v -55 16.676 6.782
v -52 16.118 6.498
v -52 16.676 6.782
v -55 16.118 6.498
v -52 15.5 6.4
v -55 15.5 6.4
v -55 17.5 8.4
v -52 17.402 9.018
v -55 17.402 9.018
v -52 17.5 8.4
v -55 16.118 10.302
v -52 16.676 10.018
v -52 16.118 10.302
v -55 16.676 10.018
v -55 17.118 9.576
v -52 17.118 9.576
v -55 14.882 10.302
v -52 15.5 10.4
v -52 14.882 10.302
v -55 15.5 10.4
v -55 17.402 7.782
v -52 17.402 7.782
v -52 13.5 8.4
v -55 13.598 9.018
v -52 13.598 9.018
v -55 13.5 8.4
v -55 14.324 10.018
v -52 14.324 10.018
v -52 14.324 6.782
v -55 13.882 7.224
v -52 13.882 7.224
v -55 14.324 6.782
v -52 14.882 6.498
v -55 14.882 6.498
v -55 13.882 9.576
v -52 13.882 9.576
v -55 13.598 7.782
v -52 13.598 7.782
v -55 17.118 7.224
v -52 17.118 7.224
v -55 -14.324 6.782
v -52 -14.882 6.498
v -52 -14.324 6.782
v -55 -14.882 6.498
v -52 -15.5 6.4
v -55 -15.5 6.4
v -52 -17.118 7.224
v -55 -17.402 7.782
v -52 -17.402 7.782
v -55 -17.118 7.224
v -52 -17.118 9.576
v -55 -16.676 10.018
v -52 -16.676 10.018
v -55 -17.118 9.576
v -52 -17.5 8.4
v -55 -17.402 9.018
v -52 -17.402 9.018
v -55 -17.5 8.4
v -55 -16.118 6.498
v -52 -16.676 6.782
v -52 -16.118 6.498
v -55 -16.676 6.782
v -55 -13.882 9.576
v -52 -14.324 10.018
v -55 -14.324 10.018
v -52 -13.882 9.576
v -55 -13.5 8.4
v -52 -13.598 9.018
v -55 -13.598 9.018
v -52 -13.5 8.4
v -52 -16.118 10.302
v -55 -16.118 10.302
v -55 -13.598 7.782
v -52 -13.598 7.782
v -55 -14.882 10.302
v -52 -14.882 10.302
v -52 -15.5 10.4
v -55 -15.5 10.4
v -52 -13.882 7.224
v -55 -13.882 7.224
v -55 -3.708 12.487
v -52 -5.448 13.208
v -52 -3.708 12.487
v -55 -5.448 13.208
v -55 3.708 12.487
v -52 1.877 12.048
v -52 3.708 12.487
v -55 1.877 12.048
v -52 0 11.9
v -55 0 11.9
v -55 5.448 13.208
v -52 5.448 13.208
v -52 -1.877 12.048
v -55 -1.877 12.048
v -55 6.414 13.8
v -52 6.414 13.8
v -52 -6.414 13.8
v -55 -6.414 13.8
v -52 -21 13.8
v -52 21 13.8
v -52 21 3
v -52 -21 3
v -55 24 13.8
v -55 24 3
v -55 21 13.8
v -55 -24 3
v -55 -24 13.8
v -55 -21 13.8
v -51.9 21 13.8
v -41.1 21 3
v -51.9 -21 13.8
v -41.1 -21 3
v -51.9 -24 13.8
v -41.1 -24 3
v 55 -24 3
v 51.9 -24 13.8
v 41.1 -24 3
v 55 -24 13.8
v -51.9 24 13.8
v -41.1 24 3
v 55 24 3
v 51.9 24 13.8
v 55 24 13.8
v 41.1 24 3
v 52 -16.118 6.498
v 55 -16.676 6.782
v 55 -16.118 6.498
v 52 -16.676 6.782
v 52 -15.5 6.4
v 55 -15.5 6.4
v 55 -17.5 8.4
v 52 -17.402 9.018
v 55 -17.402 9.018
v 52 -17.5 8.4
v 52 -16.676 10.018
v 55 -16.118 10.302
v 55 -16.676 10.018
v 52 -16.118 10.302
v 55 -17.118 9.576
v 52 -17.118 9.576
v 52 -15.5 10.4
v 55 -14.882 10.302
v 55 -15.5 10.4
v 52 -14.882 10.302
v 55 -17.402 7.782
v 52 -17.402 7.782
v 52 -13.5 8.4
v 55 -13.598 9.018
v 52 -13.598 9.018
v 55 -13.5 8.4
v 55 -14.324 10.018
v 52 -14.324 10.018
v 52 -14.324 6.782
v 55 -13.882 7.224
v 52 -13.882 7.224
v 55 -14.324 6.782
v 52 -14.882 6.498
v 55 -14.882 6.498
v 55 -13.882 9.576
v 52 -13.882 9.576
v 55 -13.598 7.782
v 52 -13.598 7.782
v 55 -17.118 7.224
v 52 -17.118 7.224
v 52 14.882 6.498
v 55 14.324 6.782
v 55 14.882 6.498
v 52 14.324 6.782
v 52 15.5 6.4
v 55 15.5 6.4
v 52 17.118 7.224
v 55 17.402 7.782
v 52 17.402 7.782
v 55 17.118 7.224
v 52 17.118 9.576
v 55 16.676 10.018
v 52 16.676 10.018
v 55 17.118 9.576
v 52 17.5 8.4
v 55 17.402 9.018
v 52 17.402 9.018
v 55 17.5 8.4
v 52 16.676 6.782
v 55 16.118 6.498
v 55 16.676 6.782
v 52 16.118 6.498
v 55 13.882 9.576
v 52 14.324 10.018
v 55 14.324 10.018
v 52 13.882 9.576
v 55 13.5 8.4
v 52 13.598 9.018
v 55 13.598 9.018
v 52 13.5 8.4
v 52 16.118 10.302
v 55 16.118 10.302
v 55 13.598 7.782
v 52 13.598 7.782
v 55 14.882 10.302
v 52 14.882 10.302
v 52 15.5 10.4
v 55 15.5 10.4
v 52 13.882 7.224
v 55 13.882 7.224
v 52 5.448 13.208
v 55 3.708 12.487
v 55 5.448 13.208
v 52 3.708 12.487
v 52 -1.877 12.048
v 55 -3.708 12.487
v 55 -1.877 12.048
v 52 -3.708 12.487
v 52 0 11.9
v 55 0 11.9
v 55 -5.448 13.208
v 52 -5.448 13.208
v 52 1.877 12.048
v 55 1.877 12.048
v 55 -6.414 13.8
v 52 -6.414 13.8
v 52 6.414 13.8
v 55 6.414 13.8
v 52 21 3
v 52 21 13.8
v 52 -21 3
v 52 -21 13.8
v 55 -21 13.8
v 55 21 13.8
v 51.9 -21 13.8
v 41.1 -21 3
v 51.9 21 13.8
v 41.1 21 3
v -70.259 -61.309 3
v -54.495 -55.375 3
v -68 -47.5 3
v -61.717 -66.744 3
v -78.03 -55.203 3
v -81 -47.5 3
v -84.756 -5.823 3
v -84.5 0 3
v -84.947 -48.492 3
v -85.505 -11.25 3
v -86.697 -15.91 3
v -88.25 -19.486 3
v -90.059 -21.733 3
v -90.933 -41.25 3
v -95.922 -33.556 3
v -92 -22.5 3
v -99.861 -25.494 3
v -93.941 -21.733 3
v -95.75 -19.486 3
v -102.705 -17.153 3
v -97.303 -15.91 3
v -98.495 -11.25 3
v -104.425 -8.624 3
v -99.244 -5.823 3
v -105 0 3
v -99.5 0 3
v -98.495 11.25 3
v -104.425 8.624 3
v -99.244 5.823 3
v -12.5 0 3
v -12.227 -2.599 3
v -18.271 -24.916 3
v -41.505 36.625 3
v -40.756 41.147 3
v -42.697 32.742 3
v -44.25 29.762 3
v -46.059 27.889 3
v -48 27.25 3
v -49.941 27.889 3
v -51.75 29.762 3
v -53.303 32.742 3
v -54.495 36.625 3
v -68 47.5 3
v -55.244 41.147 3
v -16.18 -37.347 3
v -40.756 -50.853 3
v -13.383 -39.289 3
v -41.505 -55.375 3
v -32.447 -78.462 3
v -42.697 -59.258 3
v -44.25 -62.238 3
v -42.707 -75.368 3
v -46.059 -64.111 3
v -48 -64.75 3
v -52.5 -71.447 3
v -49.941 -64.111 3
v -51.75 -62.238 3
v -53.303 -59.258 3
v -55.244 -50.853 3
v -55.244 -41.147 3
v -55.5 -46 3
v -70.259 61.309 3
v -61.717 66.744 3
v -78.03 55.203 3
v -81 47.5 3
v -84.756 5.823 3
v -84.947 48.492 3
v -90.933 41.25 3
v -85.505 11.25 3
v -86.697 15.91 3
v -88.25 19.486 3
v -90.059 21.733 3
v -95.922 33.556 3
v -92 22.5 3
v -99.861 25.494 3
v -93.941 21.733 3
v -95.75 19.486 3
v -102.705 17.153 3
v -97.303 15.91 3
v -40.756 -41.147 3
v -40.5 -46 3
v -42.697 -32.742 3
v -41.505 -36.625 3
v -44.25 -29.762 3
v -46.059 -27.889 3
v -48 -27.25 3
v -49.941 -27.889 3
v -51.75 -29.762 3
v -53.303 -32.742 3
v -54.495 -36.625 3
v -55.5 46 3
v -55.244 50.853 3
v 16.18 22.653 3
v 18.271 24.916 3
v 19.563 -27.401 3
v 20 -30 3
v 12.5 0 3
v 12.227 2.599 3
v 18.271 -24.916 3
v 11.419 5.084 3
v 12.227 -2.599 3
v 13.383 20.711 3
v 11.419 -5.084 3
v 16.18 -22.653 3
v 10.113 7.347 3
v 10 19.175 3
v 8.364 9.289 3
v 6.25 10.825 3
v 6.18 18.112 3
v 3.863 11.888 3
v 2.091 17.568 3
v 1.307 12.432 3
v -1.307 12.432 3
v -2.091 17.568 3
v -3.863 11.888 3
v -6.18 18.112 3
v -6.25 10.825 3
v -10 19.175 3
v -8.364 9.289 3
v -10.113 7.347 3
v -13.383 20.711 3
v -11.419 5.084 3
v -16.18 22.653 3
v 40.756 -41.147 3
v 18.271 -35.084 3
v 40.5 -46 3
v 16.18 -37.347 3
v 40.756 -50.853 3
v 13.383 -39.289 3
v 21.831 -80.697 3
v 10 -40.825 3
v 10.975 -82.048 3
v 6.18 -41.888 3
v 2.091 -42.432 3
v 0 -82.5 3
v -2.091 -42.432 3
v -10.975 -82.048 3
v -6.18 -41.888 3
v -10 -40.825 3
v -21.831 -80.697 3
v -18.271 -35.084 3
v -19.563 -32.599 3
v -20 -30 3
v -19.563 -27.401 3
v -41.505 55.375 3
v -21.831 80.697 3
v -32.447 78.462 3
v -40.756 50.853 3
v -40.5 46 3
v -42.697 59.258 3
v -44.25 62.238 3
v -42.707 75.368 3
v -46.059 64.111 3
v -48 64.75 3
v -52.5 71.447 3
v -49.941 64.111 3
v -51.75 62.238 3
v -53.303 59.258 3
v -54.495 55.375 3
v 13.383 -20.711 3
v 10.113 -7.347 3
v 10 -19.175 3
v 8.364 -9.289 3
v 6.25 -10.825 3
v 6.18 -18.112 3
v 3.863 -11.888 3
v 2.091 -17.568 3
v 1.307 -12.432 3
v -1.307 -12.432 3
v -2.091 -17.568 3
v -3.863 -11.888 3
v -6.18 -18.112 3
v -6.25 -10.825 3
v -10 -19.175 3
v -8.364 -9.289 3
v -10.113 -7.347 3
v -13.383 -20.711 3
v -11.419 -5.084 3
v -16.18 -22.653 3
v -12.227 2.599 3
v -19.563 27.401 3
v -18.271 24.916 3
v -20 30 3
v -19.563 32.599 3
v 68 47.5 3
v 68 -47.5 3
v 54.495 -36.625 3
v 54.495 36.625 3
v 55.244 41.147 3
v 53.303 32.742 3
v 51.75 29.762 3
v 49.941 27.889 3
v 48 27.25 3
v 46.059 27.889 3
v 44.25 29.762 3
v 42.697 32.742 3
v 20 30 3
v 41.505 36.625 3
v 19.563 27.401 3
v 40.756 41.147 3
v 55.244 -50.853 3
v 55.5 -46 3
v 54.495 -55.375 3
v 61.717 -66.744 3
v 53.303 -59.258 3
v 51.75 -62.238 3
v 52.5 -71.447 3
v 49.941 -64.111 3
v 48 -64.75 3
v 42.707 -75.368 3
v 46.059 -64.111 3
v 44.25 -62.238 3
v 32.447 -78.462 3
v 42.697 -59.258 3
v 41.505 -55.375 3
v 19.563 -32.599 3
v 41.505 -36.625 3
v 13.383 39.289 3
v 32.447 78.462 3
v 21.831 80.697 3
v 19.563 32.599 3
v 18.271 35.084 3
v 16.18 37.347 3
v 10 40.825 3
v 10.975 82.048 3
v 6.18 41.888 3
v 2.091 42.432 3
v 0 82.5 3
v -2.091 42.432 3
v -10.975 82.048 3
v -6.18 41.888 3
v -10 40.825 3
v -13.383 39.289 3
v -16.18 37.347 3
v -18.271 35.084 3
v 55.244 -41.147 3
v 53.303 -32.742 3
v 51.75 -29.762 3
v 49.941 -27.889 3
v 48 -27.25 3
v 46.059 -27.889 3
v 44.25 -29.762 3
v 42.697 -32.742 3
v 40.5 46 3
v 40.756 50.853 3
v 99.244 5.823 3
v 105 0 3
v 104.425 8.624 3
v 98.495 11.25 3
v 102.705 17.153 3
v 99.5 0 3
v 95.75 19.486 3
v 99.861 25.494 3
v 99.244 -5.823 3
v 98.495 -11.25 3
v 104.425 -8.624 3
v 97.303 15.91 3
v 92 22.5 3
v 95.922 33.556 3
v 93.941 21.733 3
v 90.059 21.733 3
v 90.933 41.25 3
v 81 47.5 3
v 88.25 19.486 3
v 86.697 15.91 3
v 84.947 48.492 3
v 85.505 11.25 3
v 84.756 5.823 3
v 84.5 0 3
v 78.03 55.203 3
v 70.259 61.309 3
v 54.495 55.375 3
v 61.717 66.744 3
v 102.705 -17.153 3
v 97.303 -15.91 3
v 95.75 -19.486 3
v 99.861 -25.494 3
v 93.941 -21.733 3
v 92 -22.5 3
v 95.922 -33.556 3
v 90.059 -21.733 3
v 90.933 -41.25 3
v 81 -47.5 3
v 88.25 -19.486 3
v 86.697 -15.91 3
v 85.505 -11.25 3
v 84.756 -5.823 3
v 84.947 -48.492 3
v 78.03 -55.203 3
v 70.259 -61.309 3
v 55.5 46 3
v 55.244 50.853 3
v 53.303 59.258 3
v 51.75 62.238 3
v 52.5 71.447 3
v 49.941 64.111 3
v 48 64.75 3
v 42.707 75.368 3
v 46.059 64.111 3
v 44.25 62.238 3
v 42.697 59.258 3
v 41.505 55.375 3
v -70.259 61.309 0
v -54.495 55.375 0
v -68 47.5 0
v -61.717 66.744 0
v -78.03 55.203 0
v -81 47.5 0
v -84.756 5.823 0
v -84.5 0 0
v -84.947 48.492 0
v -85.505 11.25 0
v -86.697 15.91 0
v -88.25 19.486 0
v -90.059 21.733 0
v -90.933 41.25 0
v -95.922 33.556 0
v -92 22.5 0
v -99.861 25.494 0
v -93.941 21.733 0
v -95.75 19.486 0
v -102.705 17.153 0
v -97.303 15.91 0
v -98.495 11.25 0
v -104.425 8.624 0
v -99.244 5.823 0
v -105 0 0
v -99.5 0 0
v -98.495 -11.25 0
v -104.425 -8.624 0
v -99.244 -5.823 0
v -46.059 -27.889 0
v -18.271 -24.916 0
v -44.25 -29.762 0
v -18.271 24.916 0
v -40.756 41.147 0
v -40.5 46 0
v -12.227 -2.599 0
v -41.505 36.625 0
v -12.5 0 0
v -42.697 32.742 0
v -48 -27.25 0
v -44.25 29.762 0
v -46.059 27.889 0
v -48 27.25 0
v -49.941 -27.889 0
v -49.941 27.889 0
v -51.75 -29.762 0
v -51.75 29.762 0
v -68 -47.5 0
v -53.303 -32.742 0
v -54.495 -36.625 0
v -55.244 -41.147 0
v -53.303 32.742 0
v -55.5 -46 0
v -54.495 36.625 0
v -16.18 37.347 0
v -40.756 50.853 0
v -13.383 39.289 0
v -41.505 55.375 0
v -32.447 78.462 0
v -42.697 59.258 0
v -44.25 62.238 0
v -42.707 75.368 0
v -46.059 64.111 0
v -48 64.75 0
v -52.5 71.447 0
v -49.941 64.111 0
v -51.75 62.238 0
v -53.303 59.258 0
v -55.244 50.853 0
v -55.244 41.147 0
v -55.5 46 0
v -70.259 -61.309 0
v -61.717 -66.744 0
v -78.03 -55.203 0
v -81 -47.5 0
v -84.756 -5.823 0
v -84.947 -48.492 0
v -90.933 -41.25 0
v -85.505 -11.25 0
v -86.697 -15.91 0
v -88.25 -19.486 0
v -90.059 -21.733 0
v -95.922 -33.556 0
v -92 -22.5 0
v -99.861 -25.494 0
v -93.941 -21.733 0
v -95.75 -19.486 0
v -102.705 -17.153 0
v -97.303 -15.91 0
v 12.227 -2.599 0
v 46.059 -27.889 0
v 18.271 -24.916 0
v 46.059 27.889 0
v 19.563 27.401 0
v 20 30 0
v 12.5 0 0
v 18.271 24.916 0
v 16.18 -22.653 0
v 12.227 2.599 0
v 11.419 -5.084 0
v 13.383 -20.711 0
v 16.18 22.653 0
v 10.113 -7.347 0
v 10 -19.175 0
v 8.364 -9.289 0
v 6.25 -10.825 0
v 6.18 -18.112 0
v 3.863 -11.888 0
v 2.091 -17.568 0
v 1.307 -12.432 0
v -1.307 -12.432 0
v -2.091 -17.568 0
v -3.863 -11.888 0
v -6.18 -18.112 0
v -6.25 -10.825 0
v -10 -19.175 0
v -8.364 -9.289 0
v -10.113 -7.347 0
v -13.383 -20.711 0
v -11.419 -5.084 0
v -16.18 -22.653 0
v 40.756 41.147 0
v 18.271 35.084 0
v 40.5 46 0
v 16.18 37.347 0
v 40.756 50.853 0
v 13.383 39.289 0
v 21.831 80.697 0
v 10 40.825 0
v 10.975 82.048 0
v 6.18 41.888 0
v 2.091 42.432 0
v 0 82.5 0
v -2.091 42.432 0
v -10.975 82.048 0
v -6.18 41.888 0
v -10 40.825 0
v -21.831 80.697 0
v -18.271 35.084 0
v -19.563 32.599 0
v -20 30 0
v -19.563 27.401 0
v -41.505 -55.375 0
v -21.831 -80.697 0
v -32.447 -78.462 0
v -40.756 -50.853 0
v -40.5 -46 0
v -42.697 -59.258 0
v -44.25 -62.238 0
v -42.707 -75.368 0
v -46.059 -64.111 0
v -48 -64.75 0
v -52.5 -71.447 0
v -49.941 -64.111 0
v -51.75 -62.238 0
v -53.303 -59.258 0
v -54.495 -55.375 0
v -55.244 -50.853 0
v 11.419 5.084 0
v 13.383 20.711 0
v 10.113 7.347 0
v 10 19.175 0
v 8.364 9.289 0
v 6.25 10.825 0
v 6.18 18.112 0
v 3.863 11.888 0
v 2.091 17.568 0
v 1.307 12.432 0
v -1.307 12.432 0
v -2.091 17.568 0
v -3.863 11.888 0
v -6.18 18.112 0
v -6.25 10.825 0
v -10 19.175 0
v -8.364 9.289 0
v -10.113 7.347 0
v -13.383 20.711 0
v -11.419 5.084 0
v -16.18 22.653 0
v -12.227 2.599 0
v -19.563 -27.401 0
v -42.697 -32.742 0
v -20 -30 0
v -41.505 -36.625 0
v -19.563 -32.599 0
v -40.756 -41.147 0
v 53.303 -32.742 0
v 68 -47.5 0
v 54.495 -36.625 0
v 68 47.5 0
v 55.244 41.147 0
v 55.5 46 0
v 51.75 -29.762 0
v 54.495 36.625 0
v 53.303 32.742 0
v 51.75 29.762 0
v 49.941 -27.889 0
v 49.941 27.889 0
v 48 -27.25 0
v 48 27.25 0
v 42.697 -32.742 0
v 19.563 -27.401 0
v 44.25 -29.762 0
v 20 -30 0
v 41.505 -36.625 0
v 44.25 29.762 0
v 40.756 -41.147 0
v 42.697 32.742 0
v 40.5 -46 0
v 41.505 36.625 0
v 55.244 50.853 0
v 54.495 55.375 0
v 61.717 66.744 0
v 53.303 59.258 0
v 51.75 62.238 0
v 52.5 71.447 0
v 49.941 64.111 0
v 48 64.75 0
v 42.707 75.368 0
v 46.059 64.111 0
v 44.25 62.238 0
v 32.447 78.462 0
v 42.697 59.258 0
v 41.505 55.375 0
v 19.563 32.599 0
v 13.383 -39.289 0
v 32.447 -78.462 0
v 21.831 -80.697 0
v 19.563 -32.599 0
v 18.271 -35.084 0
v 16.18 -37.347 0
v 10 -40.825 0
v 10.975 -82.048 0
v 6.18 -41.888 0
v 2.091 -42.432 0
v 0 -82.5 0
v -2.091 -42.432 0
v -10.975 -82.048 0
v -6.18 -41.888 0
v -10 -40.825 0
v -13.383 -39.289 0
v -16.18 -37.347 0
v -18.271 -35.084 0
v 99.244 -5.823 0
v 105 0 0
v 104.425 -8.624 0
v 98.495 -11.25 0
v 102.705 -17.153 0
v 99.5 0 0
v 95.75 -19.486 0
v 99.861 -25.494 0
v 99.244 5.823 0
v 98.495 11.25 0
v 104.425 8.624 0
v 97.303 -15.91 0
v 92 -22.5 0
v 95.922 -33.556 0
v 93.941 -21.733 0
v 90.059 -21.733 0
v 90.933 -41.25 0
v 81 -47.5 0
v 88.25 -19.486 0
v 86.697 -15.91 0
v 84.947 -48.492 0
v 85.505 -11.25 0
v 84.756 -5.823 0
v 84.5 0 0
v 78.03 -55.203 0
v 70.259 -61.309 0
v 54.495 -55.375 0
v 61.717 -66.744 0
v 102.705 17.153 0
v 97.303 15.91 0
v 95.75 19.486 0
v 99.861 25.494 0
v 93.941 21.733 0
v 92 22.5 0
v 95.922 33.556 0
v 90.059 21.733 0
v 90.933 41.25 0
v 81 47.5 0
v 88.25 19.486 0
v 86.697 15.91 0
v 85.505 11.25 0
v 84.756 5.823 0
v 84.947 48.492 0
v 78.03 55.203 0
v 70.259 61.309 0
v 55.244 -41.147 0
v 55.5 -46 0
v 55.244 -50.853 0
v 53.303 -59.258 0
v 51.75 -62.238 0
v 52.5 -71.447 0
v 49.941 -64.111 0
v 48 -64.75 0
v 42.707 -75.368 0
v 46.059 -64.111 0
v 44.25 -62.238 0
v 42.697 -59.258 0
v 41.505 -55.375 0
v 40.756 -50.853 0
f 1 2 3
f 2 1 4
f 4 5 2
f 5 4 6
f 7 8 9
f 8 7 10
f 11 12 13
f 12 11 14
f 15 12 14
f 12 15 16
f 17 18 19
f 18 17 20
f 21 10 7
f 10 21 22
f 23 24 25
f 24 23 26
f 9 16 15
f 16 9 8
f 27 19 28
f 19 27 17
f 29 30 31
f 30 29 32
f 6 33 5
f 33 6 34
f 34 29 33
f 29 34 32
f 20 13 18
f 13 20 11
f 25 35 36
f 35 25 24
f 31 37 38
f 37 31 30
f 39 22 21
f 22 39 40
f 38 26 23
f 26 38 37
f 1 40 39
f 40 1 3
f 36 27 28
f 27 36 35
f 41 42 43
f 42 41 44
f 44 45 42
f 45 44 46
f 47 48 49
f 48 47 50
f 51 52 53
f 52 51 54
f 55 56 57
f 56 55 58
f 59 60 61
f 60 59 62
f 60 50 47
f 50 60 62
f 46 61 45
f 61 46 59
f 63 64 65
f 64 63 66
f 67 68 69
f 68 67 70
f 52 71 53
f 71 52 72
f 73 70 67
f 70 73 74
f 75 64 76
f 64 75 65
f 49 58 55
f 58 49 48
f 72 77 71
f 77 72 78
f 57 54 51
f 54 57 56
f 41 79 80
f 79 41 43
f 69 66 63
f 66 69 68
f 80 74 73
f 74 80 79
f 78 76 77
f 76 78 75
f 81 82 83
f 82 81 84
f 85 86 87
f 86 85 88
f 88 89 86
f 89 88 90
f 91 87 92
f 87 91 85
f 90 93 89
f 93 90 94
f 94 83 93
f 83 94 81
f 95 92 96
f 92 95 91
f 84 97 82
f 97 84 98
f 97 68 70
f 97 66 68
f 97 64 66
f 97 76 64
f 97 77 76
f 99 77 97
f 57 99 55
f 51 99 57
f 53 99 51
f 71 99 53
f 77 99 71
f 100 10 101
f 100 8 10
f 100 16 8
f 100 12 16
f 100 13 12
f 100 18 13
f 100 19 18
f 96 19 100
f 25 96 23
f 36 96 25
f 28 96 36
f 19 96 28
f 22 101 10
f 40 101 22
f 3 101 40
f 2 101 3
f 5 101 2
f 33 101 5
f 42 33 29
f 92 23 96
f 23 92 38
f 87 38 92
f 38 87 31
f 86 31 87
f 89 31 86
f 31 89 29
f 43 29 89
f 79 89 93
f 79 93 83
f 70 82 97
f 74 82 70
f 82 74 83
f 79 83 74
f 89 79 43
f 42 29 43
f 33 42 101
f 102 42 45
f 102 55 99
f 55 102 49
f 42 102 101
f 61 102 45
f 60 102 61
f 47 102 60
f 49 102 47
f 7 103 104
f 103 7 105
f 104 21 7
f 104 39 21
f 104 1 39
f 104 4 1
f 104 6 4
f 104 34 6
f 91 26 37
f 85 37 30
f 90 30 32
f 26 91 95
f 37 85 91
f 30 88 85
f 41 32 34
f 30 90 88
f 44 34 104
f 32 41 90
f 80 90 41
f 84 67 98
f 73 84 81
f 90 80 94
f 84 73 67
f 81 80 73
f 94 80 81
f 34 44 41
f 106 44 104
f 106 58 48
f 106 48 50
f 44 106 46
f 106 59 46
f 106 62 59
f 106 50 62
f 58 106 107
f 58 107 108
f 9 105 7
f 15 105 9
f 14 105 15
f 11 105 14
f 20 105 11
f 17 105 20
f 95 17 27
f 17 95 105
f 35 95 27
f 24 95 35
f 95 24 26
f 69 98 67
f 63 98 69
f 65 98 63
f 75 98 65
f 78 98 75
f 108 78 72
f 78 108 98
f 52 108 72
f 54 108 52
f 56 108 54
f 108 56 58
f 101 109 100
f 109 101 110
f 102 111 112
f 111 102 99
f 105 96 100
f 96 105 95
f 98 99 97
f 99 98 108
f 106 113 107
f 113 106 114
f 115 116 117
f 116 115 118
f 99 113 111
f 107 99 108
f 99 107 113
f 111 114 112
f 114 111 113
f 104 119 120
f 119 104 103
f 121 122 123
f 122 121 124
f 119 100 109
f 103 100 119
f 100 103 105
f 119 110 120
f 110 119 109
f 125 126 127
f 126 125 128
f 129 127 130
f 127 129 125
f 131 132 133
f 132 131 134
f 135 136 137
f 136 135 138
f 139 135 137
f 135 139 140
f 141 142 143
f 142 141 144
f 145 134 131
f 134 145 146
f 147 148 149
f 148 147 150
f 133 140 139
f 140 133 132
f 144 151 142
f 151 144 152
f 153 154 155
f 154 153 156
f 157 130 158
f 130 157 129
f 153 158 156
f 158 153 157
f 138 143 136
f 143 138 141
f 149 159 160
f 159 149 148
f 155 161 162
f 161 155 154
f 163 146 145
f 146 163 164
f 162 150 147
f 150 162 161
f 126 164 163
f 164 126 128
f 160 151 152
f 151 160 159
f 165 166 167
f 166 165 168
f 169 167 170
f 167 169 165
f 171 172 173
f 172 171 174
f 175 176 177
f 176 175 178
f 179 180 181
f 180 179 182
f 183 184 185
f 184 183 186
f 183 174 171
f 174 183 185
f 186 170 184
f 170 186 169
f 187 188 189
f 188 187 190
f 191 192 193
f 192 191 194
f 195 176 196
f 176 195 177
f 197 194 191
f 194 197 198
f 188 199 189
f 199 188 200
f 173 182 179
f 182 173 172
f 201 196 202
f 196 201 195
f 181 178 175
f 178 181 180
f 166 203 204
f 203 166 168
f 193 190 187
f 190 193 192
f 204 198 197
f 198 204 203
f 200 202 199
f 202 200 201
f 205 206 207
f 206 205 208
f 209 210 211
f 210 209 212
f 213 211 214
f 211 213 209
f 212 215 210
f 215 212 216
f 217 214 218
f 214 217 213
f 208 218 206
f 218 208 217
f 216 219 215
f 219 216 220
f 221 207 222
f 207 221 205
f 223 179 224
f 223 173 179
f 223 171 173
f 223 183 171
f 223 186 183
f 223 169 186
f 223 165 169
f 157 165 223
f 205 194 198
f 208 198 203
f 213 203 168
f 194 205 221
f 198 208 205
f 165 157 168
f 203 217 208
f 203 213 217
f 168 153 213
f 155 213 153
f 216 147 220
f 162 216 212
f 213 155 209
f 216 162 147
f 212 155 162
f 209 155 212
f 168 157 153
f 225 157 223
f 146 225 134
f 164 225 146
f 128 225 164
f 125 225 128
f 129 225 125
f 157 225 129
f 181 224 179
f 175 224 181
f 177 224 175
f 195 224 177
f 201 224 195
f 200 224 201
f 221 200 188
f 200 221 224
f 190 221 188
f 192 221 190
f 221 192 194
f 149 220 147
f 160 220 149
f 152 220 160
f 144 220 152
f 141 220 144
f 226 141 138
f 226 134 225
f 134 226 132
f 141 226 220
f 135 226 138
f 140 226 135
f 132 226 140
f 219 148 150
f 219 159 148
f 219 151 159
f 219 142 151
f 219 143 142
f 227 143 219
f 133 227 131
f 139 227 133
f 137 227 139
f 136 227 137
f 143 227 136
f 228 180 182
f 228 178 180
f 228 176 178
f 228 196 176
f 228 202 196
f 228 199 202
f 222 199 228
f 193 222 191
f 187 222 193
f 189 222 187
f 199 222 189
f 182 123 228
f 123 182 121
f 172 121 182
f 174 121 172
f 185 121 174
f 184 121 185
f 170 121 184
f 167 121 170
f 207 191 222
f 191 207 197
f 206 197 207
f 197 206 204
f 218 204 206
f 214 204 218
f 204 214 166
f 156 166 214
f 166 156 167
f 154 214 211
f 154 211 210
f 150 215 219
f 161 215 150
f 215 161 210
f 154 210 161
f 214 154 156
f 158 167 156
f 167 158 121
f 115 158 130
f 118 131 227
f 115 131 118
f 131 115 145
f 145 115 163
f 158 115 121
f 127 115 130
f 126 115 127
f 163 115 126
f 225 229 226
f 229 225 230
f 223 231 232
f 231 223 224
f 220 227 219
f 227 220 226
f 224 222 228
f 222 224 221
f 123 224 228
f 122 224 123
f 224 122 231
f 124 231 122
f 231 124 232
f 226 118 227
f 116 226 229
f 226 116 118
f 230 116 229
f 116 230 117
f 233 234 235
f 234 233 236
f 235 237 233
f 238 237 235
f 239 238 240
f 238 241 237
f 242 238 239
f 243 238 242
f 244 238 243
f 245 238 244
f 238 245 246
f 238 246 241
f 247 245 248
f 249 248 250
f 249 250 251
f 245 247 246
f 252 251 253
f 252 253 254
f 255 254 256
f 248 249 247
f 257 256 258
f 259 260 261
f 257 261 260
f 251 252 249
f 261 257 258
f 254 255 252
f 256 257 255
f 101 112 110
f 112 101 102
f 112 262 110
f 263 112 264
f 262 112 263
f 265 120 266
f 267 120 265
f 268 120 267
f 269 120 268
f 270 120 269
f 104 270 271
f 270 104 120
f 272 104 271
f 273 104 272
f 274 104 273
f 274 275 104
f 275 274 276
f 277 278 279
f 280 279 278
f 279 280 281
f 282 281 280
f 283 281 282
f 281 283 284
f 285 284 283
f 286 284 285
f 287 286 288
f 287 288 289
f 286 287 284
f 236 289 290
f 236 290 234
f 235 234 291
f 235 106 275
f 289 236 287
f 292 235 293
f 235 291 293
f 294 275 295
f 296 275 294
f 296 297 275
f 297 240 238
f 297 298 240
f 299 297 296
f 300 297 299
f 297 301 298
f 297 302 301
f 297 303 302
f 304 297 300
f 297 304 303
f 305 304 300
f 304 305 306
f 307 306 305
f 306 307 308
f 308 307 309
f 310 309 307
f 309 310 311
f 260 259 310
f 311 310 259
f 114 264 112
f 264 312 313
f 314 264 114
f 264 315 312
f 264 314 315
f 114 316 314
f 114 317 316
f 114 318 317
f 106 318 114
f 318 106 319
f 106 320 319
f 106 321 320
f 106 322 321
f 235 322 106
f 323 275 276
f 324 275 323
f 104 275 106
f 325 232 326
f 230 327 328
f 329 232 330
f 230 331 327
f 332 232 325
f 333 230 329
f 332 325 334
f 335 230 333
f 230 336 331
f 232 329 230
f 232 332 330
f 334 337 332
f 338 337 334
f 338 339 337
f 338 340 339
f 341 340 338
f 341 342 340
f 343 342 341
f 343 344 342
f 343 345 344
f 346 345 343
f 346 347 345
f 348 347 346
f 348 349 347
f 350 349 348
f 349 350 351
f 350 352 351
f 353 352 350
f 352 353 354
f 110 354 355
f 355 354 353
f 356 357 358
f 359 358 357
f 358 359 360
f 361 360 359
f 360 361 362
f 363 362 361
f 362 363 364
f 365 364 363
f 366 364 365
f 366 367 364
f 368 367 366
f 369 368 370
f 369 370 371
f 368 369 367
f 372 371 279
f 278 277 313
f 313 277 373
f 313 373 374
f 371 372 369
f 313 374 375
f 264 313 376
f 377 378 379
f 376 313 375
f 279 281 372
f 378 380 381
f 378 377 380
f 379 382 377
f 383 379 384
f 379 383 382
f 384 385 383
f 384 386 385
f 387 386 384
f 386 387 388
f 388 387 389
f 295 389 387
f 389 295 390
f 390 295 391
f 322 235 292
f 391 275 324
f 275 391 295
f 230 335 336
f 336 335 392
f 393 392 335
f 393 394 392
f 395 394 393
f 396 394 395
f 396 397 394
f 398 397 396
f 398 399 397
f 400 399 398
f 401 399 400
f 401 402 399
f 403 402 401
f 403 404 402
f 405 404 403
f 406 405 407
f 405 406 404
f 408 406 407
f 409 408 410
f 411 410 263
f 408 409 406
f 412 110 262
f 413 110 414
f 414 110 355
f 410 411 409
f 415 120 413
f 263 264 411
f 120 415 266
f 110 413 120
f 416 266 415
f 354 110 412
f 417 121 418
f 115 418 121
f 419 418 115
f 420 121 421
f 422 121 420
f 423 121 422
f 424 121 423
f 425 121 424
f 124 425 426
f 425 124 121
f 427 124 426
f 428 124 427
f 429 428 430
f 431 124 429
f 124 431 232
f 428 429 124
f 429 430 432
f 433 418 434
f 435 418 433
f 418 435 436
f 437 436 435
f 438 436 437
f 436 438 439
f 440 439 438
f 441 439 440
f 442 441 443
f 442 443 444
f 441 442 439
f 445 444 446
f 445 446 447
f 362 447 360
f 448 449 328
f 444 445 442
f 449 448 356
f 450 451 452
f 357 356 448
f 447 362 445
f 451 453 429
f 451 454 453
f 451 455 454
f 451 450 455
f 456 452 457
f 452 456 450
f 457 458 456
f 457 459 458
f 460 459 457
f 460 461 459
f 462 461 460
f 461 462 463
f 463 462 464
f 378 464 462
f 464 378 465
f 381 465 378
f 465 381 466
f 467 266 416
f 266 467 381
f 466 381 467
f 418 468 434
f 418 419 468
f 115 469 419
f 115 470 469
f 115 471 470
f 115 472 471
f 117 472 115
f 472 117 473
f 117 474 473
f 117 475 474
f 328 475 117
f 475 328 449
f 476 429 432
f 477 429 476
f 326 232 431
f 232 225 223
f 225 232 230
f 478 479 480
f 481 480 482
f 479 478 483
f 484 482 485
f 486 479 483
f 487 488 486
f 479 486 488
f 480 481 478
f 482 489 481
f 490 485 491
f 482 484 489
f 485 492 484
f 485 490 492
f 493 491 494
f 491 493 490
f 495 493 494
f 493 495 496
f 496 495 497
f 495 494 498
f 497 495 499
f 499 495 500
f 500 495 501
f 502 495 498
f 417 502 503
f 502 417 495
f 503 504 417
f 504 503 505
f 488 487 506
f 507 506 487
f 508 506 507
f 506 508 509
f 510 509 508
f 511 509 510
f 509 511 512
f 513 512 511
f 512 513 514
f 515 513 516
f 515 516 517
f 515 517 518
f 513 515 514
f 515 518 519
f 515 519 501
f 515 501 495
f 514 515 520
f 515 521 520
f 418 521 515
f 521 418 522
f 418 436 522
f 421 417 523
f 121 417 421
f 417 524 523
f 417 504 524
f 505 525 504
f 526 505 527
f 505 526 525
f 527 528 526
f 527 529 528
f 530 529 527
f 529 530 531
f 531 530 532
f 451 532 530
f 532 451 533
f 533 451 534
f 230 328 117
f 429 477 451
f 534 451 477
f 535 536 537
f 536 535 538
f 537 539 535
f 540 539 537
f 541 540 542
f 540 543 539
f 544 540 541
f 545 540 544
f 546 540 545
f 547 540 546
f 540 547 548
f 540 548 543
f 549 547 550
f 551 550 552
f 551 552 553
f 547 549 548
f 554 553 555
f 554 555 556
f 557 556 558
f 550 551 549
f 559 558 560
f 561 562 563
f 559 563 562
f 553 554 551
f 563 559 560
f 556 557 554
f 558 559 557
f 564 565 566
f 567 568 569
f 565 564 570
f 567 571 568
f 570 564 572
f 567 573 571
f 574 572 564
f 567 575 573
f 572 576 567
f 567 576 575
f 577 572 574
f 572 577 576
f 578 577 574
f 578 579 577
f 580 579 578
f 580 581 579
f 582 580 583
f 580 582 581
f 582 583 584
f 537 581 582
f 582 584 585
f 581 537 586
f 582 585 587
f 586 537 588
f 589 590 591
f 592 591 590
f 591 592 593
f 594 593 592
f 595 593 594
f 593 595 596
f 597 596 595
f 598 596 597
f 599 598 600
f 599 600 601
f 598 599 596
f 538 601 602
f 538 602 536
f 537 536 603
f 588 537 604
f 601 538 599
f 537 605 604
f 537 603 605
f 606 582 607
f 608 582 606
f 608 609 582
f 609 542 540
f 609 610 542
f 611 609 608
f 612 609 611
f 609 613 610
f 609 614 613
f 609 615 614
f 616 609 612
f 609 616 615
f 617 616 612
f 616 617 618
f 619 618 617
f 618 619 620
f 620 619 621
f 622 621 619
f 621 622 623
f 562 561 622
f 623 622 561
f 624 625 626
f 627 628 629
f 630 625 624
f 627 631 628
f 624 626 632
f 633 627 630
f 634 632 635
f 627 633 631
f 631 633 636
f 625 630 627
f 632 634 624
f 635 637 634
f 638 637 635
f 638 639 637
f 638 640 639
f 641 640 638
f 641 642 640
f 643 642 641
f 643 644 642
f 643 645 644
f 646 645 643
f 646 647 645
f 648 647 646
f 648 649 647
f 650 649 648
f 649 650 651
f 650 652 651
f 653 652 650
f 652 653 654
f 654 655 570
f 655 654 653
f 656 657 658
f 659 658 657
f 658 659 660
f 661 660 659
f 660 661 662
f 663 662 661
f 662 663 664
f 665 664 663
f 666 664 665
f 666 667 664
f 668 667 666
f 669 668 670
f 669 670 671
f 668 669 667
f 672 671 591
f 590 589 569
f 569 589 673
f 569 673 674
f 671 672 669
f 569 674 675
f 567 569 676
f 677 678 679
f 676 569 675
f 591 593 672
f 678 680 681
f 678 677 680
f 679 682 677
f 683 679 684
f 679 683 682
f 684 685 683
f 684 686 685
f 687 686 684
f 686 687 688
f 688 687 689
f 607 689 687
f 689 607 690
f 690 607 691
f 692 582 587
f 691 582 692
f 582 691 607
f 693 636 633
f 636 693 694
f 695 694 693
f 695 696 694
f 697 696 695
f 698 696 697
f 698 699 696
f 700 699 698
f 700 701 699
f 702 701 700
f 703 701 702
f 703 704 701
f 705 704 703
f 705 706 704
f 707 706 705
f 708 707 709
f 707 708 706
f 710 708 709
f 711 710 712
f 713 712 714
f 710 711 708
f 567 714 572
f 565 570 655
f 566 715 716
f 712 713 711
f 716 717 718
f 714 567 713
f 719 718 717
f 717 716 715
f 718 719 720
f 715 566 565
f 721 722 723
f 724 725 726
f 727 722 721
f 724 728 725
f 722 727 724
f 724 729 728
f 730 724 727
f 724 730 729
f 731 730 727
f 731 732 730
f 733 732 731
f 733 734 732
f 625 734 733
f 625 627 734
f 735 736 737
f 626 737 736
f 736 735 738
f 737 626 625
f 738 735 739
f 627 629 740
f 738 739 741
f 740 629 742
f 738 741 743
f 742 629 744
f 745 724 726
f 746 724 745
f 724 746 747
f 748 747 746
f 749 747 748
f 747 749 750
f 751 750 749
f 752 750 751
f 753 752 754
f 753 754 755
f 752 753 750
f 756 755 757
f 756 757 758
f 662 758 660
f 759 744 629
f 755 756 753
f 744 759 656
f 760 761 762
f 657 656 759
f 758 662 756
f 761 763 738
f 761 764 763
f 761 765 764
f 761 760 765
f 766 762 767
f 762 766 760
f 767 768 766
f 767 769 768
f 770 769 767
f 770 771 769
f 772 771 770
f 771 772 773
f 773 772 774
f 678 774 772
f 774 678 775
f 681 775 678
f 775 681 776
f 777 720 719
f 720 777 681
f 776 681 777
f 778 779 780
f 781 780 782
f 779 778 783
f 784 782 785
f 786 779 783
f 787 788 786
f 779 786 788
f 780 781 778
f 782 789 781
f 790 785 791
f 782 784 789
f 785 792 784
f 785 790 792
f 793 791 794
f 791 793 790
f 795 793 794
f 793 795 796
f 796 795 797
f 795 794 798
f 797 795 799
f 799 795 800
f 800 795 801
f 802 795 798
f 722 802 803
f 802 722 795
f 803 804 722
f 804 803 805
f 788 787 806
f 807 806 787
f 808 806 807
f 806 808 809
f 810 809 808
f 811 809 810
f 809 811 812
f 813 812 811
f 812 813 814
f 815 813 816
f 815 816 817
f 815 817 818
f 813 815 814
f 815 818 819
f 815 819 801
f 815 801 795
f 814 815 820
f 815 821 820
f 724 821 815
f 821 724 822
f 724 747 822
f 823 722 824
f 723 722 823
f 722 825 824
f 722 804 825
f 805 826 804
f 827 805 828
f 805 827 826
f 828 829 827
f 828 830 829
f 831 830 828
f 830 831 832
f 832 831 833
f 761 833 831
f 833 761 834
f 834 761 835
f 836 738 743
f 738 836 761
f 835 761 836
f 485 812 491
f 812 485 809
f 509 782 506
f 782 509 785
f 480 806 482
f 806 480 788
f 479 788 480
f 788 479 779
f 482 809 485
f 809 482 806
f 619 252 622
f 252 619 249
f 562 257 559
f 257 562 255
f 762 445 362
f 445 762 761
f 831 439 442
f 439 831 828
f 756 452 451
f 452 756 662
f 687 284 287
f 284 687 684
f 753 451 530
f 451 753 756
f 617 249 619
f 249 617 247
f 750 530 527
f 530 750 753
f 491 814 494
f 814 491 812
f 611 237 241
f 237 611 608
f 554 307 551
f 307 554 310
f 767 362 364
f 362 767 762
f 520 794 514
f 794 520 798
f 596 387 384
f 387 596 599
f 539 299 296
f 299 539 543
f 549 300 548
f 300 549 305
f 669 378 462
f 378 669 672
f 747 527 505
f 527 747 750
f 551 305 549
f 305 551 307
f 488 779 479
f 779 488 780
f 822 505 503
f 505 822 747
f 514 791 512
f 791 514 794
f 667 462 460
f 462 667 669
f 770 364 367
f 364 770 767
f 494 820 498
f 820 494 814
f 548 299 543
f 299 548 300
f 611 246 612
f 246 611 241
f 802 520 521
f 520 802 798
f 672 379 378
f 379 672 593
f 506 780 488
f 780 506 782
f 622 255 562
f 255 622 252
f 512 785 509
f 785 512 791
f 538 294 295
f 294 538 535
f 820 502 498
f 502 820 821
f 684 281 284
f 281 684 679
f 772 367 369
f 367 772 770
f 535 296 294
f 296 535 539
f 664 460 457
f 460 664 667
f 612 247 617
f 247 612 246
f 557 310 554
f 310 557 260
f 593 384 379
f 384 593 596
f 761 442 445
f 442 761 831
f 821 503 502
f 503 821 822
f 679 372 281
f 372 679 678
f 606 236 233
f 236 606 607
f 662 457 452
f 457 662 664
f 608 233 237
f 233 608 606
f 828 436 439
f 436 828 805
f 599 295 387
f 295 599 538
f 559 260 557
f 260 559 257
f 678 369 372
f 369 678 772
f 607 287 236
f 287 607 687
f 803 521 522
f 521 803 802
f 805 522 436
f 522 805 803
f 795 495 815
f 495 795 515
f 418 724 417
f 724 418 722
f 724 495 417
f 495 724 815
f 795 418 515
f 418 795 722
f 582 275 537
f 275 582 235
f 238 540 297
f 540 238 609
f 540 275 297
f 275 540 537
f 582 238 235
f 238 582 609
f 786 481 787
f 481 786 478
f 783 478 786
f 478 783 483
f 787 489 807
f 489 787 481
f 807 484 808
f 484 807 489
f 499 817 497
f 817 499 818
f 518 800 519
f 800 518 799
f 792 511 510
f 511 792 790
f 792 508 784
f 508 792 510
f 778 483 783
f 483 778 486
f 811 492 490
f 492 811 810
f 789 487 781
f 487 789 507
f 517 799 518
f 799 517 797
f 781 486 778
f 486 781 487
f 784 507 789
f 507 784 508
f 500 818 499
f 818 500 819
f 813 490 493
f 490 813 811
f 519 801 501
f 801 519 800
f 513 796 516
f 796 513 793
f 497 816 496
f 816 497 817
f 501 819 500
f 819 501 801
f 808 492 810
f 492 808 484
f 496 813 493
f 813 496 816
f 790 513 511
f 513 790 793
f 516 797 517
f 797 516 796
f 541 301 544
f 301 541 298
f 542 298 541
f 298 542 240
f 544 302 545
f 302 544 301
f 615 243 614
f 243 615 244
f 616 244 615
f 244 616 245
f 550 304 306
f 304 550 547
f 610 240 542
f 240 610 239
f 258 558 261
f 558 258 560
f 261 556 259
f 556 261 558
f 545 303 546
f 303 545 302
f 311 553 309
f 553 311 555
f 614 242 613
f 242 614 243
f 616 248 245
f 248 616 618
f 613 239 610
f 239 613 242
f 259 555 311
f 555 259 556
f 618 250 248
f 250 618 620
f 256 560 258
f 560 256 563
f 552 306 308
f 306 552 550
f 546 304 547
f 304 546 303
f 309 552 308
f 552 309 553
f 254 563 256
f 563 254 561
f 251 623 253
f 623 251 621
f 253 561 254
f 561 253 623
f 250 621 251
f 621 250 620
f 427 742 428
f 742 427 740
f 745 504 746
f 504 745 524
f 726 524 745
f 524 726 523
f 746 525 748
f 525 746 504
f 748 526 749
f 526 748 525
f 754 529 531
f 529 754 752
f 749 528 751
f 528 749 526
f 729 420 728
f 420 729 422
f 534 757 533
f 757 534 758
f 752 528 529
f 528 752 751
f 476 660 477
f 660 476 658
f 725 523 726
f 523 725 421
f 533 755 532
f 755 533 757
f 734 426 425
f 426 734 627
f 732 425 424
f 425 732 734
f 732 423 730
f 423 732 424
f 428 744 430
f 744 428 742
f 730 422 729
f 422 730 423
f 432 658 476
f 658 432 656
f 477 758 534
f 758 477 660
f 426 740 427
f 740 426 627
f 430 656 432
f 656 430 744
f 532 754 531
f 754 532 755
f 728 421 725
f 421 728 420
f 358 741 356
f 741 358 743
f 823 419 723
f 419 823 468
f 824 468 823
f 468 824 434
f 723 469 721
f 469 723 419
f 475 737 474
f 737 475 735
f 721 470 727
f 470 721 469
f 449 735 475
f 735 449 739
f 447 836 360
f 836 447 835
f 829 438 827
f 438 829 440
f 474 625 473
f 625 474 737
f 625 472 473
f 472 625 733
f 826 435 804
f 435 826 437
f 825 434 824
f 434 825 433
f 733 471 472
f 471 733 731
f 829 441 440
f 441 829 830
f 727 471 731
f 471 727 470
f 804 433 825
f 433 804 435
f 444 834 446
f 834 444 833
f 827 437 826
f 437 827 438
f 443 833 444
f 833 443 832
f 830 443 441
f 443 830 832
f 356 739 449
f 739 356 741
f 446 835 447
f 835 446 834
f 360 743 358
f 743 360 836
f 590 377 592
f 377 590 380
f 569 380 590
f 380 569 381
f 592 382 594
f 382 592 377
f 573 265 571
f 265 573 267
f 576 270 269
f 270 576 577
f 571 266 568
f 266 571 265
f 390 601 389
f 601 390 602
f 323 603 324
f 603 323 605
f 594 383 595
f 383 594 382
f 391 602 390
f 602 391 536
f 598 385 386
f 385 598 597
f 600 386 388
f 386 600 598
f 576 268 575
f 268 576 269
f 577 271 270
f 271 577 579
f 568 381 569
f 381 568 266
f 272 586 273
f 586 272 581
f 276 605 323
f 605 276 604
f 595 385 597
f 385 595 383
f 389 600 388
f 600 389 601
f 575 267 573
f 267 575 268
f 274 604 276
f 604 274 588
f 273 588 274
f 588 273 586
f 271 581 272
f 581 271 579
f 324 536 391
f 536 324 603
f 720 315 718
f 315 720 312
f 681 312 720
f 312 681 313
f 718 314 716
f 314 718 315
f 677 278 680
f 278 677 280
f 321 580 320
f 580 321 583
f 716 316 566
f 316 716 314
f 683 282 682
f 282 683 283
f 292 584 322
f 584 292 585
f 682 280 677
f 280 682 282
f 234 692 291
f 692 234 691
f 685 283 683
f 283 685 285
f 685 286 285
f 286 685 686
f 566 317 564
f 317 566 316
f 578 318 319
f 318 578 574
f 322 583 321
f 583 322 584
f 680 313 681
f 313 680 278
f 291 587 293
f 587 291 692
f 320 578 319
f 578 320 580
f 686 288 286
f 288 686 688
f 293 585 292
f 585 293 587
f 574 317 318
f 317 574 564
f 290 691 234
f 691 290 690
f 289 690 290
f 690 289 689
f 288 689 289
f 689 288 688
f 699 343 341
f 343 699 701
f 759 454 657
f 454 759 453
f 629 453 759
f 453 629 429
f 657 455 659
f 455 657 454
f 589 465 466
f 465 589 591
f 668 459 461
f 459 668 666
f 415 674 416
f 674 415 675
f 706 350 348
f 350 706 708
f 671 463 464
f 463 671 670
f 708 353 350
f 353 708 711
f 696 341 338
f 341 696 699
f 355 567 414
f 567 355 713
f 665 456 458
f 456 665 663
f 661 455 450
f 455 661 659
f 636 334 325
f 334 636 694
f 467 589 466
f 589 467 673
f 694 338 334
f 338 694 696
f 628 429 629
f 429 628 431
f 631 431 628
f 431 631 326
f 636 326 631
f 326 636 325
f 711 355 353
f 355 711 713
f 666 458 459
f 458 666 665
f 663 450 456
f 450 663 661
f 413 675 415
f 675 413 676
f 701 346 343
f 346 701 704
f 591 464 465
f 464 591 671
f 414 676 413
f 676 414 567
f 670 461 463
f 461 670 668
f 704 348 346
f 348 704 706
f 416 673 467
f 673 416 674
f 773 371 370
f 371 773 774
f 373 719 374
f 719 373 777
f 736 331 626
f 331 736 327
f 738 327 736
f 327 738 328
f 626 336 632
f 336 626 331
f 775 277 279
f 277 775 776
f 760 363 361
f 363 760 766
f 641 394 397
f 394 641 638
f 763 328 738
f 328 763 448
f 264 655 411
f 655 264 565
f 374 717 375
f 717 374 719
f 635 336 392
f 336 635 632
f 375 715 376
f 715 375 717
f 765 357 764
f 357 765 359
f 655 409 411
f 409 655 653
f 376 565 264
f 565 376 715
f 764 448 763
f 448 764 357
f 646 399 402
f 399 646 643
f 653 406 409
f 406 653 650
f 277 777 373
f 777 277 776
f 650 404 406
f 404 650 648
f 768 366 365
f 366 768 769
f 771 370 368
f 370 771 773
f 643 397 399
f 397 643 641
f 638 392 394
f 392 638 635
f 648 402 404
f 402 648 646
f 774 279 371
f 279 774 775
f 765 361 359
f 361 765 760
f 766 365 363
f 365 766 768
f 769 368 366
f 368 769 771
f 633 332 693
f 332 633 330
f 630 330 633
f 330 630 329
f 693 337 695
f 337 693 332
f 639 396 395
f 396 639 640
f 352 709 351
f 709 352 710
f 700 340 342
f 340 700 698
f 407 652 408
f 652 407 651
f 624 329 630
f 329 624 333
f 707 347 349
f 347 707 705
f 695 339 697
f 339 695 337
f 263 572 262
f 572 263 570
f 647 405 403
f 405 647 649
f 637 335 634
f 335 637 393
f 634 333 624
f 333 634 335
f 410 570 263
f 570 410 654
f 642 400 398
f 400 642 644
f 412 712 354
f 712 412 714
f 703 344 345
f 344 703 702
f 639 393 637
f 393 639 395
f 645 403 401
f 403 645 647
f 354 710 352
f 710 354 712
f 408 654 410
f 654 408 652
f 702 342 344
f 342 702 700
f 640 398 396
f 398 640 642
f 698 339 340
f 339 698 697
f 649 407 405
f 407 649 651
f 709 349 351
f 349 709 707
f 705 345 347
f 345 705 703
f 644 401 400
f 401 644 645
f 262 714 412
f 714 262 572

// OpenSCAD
// file: lib/stepper.scad
smWidth = 42;
smLength = 40;
smScrewHoleOffsets = 31/2;
smCenterDiameter = 22;
smExtra = 1;

module stepperMotor() {
    smCenterHeight = 2;
    smShaftDiameter = 5;
    smShaftLength = 23;
    smScrewDepth = 4.5;
    smScrewDiameter = 3;
    smEdgeTrimOffset = 27;
    module add() {
        translate([-smWidth/2, -smLength, -smWidth/2]) {
            cube([smWidth, smLength, smWidth]);
        }
        rotate([-90, 0, 0]) {
            cylinder(d=smCenterDiameter, h=smCenterHeight, $fn=30);
            cylinder(d=smShaftDiameter, h=smShaftLength, $fn=20);
        }
    }
    module del() {
        for (x = [smScrewHoleOffsets, -smScrewHoleOffsets]) {
            for (z = [smScrewHoleOffsets, -smScrewHoleOffsets]) {
                translate([x, iota, z]) {
                    rotate([90, 0, 0]) {
                        cylinder(d=smScrewDiameter, h=smScrewDepth, $fn=40);
                    }
                }
            }
        }
        for (a = [45, 135, 225, 315]) {
            rotate([0, a, 0]) {
                translate([smEdgeTrimOffset,
                        -smLength-iota, -smWidth/2-iota]) {
                    cube([smWidth, smLength+2*iota, smWidth+2*iota]);
                }
            }
        }

    }
    difference() {
        add();
        del();
    }
}

module stepperMotorHole() {
    smHoleHeight = 20;
    smScrewHoleDiameter = 4;

    widthPlusExtra = smWidth + smExtra;
    lengthPlusExtra = smLength + smExtra/2;

    translate([-smWidth/2, -lengthPlusExtra, -widthPlusExtra/2]) {
        cube([smWidth, lengthPlusExtra, widthPlusExtra]);
    }
    translate([0, -iota, 0]) {
        rotate([-90, 0, 0]) {
            cylinder(d=smCenterDiameter+smExtra, h=smHoleHeight, $fn=40);
        }
    }
    for (x = [smScrewHoleOffsets, -smScrewHoleOffsets]) {
        for (z = [smScrewHoleOffsets, -smScrewHoleOffsets]) {
            translate([x, smHoleHeight-iota, z]) {
                rotate([90, 0, 0]) {
                    cylinder(d=smScrewHoleDiameter, h=smHoleHeight, $fn=40);
                }
            }
        }
    }

}
// file: lib/commonConstants.scad
// A small quantity to keep parts from starting or ending at exactly the
// same location. For example when we create a hole through an object we
// want the object being subtracted to stick slightly past the object being
// subtracted from.
iota = 0.1;


// Length and hole diameter of the #4 x 3/8in Phillips mount screw.
screwLength = 9.3;
screwHoleDiameter = 2.75;
screwHeadDiameter = 6.5;
screwBodyDiameter = 3.4;


// These constants are the basic parameters of the mount plate. They are
// necessary for other components to make their calculations.
mountPlateWidth = 37.6;
mountPlateLength = 51;


// These constants are the basis for the carbon fiber mount points. They are
// necessary for other components to make their calculations.
mountRodDiameter = 5.5;         // A little extra because holes are smaller.
mountThickness = 9;
mountDiameter = mountRodDiameter + 2*mountThickness;


// These constasnts are teh basis for the motor base. They are necessary for
// other components to make their calculations.
motorBaseExtraAxisOffset = 5;
motorBaseTopOffset = sqrt(3)*mountPlateWidth/6 + motorBaseExtraAxisOffset;
motorBaseBottomOffset = mountPlateLength/sqrt(2) + motorBaseTopOffset;
motorBaseBottomRadius = sqrt(pow(motorBaseBottomOffset,2) +
                             pow(mountPlateWidth/2, 2));
mountBaseRodOffsets = motorBaseBottomRadius-mountDiameter/2;
// main file
include <lib/commonConstants.scad>;
include <lib/stepper.scad>;
include <lib/commonMounts.scad>;

twoWheelBaseSkirt();
